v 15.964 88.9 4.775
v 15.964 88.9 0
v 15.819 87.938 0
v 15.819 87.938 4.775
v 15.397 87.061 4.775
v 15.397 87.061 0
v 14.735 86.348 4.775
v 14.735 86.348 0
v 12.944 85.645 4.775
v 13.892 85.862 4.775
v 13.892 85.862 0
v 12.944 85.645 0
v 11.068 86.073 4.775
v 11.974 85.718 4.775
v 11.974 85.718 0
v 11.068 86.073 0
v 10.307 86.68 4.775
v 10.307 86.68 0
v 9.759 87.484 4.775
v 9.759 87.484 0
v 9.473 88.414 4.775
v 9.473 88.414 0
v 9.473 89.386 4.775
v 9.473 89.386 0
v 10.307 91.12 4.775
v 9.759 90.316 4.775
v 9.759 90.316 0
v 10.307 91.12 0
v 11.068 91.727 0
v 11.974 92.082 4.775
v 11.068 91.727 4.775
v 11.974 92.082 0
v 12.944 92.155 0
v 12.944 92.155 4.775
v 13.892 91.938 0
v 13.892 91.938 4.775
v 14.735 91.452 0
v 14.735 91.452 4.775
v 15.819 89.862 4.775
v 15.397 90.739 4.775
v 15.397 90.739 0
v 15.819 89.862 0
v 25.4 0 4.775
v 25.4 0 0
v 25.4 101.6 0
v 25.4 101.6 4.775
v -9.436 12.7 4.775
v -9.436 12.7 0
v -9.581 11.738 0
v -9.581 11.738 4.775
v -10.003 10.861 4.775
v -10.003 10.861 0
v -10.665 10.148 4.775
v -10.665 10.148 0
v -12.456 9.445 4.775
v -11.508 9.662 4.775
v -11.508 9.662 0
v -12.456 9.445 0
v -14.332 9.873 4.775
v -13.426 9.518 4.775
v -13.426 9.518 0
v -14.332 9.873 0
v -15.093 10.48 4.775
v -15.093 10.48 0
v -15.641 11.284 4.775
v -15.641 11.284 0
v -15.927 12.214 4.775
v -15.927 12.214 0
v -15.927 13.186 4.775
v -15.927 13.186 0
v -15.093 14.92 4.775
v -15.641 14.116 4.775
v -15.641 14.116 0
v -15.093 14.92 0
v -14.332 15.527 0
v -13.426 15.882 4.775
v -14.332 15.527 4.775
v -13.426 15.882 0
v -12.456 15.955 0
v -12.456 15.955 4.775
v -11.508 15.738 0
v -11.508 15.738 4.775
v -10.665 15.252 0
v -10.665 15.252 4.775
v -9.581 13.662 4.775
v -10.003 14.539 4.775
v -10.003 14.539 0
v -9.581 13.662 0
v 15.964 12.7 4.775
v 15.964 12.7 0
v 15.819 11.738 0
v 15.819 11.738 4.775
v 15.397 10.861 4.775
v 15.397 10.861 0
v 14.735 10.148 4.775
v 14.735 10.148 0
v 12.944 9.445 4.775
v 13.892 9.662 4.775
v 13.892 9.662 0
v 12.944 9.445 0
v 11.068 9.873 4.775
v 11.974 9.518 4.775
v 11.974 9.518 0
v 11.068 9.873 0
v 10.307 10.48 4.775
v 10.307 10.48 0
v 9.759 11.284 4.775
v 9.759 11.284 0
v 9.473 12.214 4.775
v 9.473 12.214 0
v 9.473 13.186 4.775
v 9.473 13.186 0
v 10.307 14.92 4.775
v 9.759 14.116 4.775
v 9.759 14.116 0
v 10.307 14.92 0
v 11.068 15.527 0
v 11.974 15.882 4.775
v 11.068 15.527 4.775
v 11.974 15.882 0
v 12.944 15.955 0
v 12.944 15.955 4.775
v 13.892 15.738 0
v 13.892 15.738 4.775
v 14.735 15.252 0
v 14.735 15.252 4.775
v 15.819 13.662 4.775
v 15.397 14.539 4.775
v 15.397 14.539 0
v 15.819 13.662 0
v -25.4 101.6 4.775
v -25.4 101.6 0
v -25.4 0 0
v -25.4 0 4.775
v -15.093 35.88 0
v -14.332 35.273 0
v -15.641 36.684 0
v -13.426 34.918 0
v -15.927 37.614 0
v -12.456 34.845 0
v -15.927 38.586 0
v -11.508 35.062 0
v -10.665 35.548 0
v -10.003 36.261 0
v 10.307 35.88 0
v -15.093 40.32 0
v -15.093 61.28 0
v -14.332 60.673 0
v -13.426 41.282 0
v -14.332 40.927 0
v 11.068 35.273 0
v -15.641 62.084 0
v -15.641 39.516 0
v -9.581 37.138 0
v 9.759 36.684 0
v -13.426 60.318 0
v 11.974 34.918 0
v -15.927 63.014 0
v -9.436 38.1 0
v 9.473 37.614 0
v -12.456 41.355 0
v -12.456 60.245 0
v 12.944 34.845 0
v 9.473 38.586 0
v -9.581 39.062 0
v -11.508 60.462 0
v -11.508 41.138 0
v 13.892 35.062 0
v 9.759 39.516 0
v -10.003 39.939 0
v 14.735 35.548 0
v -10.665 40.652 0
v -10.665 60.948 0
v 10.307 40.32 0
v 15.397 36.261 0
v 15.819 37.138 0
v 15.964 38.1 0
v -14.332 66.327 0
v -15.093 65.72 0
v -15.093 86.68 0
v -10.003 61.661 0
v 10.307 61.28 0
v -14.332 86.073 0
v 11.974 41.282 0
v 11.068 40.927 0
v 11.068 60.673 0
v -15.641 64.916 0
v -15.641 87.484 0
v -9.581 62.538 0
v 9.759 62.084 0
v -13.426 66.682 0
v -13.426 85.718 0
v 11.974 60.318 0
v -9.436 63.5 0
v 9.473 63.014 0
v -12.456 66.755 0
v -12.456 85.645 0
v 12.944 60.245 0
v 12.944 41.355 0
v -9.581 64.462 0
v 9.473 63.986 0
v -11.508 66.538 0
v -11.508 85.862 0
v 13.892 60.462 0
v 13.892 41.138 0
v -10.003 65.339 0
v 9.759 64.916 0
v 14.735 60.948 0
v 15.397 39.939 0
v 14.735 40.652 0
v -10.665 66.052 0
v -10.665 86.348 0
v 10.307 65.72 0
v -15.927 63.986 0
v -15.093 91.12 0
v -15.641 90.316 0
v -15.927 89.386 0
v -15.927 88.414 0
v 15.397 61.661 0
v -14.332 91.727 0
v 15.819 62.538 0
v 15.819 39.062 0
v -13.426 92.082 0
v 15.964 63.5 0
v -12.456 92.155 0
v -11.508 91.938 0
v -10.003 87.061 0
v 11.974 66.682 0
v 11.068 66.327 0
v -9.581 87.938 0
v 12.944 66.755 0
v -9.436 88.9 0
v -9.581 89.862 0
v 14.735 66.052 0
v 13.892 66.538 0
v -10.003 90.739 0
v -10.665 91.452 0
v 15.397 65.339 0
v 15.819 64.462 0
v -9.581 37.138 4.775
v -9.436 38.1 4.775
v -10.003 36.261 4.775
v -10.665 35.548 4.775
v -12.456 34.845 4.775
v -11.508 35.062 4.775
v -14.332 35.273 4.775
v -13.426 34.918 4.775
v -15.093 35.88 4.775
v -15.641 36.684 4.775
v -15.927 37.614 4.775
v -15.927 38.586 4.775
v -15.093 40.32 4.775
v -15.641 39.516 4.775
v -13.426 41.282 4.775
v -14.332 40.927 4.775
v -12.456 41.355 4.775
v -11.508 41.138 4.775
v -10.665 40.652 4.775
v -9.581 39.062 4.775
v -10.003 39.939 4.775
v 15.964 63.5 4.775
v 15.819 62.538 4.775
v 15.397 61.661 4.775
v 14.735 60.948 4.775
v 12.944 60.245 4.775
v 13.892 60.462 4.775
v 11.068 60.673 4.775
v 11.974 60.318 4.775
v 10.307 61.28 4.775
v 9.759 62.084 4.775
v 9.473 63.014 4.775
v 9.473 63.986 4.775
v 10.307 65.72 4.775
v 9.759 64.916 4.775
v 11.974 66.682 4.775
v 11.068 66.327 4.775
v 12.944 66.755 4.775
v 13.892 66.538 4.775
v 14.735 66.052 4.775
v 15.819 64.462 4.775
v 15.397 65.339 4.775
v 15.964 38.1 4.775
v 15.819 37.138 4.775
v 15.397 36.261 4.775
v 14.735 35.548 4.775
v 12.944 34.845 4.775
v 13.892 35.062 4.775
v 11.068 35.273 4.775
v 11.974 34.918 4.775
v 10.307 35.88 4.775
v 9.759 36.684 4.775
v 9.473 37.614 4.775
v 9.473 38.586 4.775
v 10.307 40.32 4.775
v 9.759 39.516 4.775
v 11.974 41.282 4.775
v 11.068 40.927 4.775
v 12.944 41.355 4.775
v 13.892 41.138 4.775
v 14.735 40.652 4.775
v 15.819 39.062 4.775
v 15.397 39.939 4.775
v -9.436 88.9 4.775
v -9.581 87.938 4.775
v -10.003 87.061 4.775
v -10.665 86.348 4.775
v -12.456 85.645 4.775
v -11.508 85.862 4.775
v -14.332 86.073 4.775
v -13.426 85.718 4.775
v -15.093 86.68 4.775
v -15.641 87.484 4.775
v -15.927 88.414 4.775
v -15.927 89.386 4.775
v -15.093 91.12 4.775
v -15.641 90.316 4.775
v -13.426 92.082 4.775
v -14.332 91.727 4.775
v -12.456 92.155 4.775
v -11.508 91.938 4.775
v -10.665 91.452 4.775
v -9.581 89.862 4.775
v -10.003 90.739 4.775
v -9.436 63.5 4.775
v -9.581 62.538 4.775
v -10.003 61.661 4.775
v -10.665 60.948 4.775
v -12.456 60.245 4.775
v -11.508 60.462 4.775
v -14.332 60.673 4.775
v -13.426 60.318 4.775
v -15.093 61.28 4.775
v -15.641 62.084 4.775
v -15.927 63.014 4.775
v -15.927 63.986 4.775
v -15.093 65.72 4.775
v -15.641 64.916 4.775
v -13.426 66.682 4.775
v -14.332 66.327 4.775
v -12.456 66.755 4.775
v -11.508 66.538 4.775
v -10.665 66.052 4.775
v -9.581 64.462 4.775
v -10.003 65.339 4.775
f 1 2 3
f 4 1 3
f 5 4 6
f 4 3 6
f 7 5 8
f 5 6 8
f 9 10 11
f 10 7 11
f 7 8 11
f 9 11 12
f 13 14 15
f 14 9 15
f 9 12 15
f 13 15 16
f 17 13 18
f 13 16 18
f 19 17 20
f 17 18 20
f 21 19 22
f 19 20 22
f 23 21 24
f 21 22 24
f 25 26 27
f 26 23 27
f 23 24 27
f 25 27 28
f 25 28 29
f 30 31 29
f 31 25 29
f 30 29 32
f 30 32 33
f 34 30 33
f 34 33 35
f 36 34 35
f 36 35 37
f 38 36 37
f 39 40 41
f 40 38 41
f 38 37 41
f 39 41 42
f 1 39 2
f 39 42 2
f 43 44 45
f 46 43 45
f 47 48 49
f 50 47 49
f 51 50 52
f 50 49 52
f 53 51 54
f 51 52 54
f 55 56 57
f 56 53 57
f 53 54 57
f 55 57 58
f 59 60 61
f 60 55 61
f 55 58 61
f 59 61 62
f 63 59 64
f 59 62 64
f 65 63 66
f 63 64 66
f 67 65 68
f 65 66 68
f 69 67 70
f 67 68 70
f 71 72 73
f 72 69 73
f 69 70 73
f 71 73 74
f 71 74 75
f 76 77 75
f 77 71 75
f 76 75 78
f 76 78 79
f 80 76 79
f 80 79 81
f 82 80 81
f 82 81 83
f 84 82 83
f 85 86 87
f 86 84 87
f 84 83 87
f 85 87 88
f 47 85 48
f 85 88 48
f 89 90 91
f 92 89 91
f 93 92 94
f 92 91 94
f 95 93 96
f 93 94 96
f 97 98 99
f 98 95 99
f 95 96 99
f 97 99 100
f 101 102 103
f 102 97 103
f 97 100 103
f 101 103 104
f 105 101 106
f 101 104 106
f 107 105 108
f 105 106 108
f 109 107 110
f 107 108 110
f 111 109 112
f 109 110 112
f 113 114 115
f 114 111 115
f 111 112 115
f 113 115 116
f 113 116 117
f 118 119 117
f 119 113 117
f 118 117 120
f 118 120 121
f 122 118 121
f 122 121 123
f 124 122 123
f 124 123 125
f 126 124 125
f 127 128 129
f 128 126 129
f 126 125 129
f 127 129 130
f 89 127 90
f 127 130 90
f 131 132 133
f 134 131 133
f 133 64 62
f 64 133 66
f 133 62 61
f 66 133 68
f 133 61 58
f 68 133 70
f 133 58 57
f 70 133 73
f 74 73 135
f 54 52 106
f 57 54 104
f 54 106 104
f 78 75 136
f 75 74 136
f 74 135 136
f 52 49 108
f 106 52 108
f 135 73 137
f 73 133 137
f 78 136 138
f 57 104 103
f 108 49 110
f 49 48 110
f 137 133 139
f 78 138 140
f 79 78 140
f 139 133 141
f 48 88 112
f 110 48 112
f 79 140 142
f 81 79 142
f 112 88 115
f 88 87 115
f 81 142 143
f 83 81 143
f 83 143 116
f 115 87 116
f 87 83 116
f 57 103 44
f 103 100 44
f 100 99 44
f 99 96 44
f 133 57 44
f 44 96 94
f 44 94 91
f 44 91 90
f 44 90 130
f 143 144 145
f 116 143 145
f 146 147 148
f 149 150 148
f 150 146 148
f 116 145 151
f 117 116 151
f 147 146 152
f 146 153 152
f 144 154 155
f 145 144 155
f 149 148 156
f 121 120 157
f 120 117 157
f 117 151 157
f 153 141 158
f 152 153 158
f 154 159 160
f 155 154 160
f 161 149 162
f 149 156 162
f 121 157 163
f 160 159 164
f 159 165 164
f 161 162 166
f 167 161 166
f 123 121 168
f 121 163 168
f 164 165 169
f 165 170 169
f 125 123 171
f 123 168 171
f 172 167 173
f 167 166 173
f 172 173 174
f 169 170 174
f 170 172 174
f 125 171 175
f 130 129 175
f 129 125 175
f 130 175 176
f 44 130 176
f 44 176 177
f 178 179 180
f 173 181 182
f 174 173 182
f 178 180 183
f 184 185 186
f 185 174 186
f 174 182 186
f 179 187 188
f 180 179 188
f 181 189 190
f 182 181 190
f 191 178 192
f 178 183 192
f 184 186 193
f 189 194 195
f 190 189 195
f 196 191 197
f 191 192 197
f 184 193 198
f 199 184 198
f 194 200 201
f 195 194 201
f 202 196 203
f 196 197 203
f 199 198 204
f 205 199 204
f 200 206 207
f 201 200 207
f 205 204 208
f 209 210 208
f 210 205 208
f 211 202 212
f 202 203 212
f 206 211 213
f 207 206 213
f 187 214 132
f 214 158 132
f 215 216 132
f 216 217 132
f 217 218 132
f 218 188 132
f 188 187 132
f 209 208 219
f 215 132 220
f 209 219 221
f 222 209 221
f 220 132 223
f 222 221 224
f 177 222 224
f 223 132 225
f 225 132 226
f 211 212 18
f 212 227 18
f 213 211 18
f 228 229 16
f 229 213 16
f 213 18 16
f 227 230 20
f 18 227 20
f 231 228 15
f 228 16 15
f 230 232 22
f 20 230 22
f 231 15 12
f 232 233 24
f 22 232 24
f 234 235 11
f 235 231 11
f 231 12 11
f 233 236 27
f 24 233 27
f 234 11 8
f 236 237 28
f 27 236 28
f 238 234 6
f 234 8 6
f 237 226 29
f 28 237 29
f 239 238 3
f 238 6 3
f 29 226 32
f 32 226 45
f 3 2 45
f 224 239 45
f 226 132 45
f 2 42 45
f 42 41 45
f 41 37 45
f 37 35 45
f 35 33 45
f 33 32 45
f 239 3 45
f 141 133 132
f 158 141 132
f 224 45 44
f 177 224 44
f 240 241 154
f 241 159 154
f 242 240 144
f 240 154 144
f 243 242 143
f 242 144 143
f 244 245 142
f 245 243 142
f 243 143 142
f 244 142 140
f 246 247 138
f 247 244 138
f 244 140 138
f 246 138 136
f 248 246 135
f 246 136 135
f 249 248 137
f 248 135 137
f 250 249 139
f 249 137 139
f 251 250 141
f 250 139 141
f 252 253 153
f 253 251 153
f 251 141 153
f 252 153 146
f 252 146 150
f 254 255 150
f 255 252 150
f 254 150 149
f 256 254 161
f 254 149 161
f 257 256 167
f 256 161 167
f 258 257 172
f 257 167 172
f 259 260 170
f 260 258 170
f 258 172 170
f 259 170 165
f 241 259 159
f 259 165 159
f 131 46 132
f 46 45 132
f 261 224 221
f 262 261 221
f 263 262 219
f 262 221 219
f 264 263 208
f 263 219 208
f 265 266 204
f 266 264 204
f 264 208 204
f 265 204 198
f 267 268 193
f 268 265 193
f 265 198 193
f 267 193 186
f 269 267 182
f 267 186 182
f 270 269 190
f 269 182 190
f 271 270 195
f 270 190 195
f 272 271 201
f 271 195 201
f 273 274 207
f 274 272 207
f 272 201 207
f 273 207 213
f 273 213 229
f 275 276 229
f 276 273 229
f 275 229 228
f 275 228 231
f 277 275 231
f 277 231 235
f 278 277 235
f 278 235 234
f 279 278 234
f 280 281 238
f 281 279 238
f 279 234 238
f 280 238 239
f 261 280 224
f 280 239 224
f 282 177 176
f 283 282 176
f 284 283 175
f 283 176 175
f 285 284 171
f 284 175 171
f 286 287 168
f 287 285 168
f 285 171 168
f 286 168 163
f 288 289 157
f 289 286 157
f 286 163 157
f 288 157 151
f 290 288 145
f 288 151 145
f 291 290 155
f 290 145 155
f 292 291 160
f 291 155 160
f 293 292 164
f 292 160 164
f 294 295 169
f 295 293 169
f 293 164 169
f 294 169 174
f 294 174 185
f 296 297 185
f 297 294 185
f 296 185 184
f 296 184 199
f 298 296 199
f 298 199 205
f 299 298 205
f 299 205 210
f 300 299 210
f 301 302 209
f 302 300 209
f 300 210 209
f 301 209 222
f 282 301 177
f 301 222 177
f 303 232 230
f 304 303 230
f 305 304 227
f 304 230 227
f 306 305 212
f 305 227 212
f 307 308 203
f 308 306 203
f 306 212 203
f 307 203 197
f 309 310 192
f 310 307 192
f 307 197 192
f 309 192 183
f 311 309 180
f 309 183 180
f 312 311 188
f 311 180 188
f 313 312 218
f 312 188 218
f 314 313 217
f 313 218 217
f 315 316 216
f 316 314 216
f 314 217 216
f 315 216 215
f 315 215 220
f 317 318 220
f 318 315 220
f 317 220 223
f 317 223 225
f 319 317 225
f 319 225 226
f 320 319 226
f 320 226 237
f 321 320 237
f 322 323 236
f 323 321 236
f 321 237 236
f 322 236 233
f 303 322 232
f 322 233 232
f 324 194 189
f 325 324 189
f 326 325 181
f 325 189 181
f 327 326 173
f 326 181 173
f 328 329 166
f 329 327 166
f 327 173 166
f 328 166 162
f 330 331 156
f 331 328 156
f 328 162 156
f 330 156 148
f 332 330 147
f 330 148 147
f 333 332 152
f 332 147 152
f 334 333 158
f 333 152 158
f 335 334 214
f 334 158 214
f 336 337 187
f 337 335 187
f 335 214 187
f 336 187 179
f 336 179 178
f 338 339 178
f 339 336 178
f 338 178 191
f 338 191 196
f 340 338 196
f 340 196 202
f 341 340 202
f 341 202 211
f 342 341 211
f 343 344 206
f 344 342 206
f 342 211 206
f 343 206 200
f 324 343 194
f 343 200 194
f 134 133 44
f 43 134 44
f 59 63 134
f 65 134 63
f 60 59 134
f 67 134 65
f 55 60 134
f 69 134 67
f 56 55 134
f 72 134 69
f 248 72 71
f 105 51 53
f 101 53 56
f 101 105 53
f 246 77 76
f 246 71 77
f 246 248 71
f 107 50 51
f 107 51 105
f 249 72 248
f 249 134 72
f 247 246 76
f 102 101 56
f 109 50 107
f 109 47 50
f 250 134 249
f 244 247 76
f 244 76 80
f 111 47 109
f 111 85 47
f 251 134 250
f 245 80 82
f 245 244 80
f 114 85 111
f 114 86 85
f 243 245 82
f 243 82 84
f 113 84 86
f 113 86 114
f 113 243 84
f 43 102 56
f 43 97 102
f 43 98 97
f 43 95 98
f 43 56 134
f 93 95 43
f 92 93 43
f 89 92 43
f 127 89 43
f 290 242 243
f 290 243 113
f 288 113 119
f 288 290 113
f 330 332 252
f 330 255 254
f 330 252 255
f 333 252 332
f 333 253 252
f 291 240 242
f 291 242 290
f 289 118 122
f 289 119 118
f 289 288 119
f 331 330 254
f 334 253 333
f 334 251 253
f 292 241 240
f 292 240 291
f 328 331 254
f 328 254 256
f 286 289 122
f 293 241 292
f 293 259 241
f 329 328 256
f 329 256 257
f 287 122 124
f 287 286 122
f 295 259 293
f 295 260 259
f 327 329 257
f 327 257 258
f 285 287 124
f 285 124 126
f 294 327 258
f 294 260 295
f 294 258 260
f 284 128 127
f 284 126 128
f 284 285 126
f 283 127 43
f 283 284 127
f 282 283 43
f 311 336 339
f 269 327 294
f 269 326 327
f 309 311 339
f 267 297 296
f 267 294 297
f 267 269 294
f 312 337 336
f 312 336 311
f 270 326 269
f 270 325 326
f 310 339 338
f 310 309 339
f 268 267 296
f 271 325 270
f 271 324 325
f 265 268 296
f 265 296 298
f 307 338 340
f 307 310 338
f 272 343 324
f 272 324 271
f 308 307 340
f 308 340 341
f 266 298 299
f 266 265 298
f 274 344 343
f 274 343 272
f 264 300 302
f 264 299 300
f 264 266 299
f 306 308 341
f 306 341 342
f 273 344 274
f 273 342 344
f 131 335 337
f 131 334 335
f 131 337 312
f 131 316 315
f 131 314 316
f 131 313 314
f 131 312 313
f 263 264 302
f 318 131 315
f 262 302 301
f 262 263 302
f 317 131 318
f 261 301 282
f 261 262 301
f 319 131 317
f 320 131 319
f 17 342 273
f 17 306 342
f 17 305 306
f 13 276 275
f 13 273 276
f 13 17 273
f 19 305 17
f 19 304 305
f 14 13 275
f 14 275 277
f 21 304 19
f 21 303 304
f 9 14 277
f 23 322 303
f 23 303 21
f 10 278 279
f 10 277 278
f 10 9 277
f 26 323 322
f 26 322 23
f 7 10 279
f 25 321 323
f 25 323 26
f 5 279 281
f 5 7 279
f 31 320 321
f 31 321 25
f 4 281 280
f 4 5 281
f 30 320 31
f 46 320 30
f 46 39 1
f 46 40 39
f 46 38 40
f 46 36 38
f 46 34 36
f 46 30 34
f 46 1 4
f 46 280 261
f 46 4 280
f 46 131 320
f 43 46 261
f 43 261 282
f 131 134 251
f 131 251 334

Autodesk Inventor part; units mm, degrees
ref_plane "YZ Plane" through (0, 0, 0) normal (1, 0, 0) x (0, 1, 0)
ref_plane "XZ Plane" through (0, 0, 0) normal (0, 1, 0) x (-1, 0, 0)
ref_plane "XY Plane" through (0, 0, 0) normal (0, 0, 1) x (1, 0, 0)
sketch "Sketch_1" plane through (0, 0, 0) normal (0, 0, 1) x (1, 0, 0)
  line L0 (-25.4, 101.6) -> (-25.4, 0)
  line L1 (-25.4, 0) -> (25.4, 0)
  line L2 (25.4, 0) -> (25.4, 101.6)
  line L3 (25.4, 101.6) -> (-25.4, 101.6)
  circle A0 centre (12.7, 12.7) radius 3.2639
  circle A1 centre (12.7, 38.1) radius 3.2639
  circle A2 centre (12.7, 63.5) radius 3.2639
  circle A3 centre (12.7, 88.9) radius 3.2639
  circle A4 centre (-12.7, 12.7) radius 3.2639
  circle A5 centre (-12.7, 38.1) radius 3.2639
  circle A6 centre (-12.7, 63.5) radius 3.2639
  circle A7 centre (-12.7, 88.9) radius 3.2639
extrude "Extrusion1" add sketch "Sketch_1" along normal blind 4.7752
properties part number "4165"
